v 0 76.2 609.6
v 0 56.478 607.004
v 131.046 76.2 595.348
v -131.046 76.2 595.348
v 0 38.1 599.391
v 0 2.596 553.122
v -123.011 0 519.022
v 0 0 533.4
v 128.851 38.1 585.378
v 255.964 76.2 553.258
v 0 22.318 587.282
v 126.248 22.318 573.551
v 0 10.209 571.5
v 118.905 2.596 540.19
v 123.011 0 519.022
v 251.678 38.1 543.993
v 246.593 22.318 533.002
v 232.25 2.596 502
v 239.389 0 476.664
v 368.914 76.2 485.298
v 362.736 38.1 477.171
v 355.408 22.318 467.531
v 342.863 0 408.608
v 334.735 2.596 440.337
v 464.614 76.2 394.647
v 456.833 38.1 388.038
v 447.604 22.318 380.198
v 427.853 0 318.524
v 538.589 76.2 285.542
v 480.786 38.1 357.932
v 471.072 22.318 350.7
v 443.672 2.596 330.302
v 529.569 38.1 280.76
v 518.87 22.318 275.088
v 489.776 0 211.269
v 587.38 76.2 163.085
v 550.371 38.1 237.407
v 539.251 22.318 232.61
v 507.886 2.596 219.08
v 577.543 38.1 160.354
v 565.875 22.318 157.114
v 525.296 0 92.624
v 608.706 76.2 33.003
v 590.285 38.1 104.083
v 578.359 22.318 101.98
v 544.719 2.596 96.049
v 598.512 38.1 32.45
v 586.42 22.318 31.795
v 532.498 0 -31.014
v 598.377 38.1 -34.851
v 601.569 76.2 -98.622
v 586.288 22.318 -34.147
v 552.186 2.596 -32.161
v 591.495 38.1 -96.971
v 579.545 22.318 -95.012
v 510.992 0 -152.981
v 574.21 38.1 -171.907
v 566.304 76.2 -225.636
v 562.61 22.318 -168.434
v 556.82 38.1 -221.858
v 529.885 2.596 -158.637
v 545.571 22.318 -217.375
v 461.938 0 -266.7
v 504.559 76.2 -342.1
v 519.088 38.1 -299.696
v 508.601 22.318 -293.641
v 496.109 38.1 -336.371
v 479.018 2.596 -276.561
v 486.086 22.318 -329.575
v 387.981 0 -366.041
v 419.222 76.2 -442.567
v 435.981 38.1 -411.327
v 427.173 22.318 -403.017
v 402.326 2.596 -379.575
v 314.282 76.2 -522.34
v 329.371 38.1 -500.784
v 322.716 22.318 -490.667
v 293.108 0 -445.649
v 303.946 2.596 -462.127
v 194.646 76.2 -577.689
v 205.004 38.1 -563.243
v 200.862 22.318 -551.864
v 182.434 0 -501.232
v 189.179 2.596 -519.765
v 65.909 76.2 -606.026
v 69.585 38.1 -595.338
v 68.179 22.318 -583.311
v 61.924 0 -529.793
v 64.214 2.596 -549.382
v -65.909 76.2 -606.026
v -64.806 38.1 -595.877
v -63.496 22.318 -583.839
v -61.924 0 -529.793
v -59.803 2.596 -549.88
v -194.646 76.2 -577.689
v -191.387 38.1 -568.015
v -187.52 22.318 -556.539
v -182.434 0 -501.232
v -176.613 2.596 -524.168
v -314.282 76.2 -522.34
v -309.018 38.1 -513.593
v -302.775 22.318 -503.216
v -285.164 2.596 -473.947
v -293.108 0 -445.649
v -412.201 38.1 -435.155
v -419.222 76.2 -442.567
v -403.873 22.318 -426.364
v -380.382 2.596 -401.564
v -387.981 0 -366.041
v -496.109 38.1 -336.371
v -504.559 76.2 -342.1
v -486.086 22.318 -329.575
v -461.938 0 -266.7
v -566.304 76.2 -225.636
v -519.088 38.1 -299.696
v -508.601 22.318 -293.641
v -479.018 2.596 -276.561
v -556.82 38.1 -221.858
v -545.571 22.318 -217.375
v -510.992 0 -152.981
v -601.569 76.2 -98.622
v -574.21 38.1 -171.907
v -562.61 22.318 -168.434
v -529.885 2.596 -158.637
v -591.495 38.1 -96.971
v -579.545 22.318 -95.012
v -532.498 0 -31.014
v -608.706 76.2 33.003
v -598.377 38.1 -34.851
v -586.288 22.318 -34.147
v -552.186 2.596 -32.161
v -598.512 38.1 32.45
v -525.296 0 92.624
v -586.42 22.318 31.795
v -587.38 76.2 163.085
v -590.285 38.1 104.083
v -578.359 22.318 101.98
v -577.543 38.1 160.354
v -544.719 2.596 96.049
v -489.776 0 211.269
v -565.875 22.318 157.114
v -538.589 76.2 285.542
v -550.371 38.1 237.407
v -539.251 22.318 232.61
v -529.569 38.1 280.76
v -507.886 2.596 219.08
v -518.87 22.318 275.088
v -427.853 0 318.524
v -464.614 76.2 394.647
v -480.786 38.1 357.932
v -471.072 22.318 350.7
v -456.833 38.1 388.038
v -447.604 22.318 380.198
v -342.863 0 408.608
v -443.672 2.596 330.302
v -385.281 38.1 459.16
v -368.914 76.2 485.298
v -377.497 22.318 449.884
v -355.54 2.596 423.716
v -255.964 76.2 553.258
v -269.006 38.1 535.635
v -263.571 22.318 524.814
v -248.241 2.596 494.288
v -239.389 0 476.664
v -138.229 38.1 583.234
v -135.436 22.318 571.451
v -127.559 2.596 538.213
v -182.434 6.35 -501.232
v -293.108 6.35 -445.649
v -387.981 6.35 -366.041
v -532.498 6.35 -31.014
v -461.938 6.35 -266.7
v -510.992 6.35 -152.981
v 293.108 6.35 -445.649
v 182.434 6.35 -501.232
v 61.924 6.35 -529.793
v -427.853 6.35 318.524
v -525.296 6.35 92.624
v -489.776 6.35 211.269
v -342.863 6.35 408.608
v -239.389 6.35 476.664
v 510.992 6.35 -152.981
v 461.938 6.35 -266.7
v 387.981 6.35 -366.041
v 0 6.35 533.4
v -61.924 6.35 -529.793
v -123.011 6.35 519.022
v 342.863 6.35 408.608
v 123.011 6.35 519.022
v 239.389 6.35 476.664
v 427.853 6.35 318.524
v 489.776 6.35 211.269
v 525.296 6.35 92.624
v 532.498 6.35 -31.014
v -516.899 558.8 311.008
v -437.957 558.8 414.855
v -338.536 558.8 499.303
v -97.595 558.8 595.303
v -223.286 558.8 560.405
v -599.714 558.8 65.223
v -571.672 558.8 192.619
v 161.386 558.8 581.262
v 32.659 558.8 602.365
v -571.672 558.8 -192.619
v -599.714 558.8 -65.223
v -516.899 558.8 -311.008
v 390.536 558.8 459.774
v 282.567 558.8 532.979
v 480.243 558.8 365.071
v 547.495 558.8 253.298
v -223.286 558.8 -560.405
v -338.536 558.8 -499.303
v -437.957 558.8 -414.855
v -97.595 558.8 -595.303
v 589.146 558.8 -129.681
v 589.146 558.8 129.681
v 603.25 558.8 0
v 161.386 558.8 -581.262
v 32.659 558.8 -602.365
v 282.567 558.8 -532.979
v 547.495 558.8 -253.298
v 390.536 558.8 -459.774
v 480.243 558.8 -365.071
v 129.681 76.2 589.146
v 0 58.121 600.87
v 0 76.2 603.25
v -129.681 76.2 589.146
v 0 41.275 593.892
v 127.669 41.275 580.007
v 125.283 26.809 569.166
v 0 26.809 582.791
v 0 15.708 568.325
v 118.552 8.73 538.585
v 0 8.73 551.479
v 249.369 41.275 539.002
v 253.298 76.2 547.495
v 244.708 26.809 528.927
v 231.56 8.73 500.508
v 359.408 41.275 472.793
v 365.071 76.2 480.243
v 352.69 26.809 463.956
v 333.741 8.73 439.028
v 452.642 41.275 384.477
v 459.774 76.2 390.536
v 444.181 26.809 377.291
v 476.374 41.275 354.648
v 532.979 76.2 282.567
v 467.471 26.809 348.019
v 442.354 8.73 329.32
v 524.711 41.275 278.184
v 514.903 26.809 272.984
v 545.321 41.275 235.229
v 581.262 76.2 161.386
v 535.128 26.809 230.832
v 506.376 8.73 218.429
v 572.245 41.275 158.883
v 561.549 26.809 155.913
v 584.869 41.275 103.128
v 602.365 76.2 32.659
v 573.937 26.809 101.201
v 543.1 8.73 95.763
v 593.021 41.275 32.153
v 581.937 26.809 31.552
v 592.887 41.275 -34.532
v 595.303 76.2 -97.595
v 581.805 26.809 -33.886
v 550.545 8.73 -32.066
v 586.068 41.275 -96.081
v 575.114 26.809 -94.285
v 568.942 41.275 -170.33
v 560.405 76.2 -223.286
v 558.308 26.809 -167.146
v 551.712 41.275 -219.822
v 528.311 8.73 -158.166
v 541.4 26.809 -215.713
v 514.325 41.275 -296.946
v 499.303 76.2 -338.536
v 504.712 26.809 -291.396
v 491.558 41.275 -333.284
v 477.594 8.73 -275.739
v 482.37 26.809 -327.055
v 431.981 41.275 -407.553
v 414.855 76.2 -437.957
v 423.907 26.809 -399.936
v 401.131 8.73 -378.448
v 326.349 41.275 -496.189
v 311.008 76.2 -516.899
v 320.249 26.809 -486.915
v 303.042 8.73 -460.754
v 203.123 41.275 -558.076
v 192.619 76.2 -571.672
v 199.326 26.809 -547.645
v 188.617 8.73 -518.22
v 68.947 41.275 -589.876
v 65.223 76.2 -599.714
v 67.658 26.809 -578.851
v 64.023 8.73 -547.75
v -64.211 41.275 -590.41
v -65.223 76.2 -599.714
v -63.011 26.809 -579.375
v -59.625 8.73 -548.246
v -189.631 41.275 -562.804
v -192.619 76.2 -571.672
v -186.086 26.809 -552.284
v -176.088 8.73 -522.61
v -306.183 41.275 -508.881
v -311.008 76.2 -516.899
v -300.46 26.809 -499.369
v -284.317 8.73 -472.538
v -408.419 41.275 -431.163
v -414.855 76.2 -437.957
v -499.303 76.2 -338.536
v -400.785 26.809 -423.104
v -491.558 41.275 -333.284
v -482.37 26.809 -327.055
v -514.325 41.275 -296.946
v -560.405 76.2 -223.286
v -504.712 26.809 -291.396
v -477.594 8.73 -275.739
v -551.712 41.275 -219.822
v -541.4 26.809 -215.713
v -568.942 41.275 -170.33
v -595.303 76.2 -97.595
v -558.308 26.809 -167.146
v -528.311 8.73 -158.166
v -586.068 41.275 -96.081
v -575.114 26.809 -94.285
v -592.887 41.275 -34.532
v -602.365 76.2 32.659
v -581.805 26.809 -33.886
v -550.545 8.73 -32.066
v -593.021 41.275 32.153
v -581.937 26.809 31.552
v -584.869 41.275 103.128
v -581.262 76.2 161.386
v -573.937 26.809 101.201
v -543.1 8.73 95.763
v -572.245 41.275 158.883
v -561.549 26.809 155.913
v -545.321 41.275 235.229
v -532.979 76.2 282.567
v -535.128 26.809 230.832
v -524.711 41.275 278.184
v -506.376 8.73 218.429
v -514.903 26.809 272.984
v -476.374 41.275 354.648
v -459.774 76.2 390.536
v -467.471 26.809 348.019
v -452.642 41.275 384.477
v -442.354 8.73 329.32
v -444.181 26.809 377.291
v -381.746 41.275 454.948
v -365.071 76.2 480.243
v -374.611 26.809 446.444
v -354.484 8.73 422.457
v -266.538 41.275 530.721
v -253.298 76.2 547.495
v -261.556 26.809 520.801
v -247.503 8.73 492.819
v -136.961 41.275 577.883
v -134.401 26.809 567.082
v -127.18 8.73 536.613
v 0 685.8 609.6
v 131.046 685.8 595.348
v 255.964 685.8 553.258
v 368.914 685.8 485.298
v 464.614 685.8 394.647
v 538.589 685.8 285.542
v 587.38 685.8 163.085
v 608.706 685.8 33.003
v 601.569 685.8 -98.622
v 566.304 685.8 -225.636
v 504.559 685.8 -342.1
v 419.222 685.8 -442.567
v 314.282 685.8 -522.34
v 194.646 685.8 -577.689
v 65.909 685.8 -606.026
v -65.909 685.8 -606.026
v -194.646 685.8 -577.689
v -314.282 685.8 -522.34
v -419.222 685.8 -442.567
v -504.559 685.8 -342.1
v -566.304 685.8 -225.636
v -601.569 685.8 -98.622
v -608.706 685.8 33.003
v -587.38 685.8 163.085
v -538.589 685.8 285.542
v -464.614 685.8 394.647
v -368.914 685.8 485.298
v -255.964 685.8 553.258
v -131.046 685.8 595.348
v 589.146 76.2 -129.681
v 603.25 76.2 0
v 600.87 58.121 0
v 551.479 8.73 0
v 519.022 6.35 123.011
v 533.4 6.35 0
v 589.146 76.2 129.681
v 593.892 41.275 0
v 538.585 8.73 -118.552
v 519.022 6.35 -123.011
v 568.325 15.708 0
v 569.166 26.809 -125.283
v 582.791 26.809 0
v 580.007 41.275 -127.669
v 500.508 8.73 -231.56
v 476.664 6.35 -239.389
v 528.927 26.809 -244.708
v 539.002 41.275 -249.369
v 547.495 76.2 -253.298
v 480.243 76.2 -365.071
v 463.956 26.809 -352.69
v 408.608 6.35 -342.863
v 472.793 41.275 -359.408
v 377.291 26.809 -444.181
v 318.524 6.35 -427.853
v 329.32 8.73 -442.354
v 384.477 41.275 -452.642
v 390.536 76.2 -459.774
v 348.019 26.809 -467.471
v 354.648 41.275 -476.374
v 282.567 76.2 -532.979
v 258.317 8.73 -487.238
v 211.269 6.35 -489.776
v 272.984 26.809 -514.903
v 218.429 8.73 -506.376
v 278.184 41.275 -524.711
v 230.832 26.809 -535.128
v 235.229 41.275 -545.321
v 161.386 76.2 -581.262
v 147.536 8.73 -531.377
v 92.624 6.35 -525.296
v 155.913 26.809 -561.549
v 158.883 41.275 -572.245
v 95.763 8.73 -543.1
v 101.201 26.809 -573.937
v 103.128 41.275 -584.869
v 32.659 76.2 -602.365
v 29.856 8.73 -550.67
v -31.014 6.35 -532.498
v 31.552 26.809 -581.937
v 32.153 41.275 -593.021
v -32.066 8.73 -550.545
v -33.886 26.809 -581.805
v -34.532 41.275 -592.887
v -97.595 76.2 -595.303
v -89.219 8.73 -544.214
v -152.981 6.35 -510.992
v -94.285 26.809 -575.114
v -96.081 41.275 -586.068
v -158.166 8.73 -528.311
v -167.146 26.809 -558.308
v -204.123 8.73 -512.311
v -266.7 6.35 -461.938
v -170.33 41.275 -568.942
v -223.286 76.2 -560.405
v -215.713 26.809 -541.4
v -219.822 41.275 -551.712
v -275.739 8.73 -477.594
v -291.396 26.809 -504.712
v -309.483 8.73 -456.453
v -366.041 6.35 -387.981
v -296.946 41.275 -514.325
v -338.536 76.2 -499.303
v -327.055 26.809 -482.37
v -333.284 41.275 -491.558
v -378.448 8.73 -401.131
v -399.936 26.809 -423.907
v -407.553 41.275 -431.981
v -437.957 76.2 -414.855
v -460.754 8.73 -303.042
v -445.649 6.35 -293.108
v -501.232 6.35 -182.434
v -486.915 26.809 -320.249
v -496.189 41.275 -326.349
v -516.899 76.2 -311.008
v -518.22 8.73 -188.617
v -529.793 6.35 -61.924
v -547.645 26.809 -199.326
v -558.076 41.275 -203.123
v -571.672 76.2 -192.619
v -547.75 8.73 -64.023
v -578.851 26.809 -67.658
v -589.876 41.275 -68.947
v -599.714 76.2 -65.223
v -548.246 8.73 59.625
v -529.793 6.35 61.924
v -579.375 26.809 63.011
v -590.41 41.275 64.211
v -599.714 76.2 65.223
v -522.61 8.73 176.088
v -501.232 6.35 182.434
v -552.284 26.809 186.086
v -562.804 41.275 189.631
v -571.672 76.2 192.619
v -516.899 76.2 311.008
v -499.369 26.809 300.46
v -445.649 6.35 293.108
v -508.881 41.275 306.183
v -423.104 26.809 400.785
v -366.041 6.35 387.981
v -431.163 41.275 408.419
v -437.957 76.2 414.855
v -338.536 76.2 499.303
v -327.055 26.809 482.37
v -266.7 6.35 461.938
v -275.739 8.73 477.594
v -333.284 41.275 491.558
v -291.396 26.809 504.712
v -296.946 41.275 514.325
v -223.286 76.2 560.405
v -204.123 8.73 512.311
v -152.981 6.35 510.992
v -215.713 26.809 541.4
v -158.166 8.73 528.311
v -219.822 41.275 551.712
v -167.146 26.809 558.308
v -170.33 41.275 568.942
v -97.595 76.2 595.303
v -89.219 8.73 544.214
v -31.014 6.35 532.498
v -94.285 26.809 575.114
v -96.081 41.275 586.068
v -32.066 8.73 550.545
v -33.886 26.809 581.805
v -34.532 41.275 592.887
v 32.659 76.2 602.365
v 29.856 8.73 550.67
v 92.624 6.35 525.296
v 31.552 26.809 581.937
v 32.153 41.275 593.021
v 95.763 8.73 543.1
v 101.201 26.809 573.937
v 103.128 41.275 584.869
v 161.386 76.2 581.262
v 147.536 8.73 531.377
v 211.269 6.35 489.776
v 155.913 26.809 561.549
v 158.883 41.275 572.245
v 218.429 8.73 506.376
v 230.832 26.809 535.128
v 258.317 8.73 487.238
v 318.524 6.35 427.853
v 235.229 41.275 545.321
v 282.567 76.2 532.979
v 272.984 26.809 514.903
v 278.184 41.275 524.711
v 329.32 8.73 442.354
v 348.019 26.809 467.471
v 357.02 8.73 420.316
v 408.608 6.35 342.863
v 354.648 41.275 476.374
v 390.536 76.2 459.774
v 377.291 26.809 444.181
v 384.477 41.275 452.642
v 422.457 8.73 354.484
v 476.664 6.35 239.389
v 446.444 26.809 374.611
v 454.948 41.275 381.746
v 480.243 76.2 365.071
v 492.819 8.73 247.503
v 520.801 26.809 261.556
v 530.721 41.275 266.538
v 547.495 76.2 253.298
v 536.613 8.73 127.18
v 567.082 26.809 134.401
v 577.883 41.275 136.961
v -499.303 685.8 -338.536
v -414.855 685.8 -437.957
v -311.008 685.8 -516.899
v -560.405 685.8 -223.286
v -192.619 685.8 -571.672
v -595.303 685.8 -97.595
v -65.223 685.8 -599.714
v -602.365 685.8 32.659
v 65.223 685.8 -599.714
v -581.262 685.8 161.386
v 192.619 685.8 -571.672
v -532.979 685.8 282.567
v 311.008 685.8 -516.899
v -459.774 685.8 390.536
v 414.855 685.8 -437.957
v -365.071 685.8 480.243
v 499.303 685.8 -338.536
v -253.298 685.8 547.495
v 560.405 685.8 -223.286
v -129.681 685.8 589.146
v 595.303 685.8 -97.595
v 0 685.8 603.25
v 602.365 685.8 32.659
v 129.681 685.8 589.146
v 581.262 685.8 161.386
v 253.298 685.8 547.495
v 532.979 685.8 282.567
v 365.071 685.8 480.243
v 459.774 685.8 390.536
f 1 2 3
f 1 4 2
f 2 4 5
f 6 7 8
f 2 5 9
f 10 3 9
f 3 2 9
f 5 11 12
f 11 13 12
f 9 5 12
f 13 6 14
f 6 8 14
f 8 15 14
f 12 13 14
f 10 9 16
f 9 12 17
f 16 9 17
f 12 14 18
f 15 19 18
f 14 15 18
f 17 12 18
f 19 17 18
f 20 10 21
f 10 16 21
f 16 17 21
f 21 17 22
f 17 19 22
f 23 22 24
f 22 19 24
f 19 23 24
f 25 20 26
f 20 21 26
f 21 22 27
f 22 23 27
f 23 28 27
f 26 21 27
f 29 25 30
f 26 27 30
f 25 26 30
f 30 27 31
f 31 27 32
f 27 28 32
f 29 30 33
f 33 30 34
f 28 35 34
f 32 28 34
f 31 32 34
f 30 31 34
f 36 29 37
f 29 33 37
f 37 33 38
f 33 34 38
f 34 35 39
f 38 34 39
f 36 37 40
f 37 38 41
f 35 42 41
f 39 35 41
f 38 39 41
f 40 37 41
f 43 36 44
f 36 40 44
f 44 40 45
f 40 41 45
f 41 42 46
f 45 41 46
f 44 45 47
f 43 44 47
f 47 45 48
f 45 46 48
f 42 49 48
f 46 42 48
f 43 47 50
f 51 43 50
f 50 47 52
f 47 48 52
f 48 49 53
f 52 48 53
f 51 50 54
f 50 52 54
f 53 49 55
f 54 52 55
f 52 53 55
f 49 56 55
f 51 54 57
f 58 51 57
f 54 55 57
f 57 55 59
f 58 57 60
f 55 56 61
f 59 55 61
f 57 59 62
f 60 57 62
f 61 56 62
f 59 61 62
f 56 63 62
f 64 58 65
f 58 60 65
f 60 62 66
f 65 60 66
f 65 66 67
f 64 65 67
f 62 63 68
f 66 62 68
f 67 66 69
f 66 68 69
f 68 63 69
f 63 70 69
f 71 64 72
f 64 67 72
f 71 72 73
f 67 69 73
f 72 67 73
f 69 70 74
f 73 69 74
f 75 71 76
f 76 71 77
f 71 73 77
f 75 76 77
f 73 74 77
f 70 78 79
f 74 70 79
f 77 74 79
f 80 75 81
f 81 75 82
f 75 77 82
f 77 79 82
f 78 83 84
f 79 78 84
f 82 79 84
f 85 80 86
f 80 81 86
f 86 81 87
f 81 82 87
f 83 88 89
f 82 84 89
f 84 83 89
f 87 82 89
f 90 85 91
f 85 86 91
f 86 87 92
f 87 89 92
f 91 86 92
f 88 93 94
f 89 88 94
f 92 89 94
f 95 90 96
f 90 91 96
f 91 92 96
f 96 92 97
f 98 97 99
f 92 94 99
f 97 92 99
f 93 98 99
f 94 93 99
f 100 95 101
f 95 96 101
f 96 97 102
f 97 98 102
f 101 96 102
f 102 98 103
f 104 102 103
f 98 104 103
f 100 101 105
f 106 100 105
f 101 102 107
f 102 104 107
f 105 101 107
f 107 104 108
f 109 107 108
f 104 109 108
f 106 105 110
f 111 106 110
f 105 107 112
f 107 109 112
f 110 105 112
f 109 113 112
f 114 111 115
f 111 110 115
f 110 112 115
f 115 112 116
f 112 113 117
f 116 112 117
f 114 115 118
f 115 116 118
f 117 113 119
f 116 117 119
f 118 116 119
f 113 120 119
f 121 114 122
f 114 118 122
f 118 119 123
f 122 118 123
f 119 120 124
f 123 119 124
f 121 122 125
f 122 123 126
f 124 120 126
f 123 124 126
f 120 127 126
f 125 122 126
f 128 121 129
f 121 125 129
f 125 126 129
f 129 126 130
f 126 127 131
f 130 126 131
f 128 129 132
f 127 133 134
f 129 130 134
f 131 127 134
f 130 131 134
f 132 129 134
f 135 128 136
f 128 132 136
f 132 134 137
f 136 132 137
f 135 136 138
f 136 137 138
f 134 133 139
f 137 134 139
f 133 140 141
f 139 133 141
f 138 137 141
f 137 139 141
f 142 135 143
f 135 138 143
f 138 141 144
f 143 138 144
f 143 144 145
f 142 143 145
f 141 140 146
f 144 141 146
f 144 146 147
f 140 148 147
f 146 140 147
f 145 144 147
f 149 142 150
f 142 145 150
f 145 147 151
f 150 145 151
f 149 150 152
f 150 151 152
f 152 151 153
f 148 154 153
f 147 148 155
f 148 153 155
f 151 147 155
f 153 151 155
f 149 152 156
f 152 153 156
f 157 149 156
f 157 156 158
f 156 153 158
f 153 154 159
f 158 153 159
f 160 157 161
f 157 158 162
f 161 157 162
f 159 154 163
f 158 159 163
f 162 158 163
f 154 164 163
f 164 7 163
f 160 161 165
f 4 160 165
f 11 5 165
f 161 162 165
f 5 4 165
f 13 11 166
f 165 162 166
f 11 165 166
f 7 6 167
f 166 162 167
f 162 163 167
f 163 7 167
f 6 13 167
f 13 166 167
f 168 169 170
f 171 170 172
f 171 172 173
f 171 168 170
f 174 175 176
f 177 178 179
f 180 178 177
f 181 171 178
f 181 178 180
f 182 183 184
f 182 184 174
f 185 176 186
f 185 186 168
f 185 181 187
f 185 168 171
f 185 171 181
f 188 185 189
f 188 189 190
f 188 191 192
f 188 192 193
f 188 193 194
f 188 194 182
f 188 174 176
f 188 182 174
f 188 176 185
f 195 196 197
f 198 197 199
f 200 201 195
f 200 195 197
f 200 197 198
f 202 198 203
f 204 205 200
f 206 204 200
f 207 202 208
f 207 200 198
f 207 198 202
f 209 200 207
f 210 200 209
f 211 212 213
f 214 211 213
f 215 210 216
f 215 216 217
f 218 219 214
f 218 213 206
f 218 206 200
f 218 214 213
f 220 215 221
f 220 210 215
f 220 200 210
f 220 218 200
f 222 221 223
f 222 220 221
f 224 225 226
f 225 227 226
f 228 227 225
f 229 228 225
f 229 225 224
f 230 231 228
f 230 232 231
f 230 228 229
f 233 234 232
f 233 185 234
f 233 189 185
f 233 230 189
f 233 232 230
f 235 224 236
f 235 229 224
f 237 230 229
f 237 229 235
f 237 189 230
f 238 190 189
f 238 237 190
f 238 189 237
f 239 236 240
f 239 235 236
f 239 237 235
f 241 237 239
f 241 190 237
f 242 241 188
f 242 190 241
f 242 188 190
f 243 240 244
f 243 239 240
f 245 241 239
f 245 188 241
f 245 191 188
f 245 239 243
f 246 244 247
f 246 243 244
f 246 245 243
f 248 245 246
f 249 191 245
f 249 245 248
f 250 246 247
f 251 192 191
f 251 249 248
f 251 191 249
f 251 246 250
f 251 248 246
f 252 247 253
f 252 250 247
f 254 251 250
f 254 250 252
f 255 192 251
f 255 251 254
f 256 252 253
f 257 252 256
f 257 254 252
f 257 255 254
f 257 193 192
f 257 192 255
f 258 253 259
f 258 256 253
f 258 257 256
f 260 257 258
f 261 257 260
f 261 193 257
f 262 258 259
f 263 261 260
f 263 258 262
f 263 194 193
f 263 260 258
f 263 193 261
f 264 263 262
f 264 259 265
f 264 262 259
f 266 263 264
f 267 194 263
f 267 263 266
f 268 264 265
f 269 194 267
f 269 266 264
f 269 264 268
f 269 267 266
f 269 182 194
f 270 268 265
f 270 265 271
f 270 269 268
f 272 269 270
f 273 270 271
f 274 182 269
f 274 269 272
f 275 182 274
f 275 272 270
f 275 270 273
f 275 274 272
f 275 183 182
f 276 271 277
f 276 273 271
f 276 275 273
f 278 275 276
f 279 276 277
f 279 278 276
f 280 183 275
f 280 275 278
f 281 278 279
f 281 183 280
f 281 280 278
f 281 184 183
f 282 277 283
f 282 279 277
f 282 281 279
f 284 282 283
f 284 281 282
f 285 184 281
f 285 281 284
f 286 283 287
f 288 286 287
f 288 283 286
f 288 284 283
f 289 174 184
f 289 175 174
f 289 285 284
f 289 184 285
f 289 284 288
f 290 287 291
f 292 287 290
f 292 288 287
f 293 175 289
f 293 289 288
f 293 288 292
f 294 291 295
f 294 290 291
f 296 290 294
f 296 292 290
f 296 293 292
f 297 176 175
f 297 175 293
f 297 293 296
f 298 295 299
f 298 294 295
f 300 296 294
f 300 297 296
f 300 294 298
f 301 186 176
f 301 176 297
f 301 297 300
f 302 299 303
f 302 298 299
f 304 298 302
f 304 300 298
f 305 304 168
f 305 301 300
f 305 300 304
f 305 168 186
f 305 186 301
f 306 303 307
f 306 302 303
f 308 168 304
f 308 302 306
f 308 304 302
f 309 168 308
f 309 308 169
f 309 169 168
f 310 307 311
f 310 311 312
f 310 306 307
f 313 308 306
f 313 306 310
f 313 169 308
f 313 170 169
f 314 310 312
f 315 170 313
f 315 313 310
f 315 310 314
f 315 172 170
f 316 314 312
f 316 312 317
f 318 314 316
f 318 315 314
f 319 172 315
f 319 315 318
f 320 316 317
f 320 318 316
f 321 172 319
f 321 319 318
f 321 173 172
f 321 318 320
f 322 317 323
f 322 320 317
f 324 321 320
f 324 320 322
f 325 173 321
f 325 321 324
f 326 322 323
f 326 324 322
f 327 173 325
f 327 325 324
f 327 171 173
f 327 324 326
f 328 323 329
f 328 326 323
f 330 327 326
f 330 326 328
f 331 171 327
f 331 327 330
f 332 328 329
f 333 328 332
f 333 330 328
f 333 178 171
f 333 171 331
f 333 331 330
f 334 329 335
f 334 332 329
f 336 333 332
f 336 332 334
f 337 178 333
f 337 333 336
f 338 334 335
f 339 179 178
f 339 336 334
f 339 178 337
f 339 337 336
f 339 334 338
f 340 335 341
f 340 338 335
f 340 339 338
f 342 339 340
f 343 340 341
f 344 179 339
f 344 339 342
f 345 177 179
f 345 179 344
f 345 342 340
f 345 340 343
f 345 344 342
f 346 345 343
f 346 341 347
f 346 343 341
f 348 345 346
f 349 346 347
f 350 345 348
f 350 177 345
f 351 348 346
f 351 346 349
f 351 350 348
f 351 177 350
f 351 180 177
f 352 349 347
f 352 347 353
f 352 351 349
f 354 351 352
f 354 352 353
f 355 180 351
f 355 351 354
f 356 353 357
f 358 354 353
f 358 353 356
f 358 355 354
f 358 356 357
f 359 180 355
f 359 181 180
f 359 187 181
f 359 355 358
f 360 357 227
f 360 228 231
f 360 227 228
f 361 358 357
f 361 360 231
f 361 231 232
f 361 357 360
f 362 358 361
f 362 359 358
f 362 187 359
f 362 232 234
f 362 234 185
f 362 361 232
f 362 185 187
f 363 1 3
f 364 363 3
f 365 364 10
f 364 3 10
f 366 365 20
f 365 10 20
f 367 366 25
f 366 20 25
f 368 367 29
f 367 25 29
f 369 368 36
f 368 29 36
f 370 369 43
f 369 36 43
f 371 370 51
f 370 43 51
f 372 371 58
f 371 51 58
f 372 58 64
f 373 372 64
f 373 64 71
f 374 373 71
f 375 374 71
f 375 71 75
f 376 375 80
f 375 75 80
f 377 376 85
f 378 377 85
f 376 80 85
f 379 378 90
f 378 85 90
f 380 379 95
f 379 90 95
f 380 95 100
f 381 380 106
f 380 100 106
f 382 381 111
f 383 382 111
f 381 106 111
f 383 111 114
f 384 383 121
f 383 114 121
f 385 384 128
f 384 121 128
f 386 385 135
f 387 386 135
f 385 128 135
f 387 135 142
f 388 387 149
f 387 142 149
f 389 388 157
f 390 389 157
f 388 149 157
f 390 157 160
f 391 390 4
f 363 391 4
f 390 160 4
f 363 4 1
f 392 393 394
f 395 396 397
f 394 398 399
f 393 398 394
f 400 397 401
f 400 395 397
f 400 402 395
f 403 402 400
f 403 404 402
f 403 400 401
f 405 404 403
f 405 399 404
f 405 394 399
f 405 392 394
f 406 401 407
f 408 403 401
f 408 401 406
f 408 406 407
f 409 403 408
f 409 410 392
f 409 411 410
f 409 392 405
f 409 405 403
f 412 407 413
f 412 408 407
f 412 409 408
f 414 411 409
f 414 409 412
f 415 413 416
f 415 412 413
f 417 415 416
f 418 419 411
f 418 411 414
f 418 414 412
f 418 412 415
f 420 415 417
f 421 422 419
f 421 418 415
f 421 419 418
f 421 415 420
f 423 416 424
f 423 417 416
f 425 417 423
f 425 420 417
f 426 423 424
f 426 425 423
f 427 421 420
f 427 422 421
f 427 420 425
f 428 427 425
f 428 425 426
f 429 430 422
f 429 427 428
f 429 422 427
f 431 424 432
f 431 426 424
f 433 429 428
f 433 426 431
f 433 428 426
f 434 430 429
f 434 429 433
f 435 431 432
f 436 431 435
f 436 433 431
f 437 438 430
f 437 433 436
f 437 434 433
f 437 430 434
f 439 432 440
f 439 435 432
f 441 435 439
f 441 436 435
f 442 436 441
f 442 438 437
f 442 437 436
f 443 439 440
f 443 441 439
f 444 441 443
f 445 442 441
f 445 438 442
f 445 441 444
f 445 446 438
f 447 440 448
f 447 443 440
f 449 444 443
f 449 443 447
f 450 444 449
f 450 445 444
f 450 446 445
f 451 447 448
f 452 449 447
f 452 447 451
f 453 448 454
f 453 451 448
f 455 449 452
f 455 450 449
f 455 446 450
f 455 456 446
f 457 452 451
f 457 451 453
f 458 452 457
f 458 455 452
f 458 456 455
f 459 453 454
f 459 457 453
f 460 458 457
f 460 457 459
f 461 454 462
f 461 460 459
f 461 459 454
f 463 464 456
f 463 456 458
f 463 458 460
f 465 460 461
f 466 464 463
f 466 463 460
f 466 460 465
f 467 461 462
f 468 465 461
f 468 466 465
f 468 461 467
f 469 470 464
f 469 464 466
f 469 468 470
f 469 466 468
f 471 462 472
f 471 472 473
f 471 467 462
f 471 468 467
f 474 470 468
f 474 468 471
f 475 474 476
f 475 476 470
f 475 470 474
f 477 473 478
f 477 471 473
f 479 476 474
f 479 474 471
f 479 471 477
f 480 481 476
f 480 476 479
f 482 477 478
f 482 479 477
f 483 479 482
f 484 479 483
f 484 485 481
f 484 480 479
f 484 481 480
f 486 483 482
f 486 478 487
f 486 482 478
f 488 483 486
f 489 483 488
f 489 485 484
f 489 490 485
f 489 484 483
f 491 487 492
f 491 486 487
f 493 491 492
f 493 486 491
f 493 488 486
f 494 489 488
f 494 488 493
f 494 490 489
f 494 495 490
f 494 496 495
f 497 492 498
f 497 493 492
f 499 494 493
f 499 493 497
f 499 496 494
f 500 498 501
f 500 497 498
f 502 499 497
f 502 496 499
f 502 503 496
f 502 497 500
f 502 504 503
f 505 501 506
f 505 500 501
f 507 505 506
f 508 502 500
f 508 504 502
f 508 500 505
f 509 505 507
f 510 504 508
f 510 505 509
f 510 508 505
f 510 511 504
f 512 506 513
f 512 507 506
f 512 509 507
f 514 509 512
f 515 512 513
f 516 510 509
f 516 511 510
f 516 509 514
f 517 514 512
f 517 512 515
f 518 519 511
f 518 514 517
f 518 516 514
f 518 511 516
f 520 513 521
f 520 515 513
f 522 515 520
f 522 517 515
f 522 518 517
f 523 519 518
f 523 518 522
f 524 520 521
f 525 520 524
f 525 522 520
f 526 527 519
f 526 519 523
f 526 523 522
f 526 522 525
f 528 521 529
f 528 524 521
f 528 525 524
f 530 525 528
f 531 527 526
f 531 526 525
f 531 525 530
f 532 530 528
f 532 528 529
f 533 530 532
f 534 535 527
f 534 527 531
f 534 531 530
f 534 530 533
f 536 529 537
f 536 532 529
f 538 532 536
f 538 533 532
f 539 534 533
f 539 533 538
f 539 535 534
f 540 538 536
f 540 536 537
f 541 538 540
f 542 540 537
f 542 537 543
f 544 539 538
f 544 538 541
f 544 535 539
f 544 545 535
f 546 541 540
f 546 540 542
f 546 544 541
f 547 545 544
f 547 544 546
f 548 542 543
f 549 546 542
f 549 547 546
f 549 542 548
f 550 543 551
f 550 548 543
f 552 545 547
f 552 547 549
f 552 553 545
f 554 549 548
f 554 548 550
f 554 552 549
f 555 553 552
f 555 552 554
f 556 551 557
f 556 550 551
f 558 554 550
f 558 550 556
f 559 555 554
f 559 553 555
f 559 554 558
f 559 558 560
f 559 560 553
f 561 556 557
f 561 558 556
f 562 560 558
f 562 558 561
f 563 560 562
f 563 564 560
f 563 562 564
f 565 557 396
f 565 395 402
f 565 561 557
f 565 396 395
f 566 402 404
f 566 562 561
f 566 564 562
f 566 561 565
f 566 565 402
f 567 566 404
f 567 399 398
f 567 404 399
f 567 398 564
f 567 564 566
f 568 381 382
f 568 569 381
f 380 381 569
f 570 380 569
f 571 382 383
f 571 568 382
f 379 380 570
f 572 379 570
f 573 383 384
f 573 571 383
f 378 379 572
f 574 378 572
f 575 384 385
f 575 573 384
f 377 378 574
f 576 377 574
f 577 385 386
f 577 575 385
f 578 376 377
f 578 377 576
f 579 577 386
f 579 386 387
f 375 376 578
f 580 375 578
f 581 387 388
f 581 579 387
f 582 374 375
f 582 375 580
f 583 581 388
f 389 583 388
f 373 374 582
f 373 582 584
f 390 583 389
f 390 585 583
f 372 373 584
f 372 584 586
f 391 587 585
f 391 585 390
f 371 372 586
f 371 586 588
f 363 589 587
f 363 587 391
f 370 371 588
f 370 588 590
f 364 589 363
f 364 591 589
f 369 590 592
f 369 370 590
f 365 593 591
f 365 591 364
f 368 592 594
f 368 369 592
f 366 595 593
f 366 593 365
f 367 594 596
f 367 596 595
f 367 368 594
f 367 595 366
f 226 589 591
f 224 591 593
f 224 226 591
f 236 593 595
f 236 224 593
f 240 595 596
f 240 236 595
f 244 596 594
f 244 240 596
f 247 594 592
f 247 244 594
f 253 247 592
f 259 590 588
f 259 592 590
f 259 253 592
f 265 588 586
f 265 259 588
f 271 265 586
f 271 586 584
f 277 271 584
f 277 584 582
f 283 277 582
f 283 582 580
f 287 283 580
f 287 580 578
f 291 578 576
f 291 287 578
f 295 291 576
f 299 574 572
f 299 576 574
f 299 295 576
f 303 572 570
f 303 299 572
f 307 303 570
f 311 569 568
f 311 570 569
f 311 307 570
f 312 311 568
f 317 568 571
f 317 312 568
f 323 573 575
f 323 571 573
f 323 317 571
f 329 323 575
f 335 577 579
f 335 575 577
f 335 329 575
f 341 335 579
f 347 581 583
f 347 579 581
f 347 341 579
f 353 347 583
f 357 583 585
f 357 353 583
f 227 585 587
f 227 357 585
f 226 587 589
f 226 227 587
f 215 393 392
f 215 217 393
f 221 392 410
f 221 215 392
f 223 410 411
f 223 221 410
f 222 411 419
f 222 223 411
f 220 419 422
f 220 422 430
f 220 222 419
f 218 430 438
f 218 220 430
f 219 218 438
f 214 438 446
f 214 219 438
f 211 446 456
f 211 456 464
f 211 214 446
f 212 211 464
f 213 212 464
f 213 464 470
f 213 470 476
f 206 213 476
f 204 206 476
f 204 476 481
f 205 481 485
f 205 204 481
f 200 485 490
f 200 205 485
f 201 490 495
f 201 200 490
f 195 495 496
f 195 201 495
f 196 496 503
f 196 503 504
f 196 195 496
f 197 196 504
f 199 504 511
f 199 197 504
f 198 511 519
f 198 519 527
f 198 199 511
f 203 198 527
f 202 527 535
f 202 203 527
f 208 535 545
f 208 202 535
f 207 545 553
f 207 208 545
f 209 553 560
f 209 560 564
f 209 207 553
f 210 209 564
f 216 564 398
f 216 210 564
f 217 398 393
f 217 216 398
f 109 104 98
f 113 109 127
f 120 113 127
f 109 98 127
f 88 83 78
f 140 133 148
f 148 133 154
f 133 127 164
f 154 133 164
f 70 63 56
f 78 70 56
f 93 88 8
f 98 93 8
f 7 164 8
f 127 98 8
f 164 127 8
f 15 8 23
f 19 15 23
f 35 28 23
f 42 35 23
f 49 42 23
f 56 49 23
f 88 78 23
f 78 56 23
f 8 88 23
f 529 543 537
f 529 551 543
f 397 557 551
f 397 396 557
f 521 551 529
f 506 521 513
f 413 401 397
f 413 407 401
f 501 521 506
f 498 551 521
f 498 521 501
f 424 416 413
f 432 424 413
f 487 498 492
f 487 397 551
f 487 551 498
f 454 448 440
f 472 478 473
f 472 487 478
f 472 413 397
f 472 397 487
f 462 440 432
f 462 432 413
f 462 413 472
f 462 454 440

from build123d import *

# Parameters (mm, degrees)
SKETCH1_R           = 609.6
BOSS_EXTRUDE1_DEPTH = 685.8
FILLET1_R           = 76.2
SHELL1_T            = -6.35


# Read off the part's stored shape, not the designer's step: Boss-Extrude2
with BuildPart() as part:
    # Sketch1 → Boss-Extrude1 (new body)
    with BuildSketch(Plane(origin=(0, 0, 0), x_dir=(1, 0, 0), z_dir=(0, 1, 0))):
        with Locations(Location((0, 0, 0), (0, 0, 270))):
            Circle(SKETCH1_R)
    extrude(amount=BOSS_EXTRUDE1_DEPTH)

    # Fillet1
    fillet1_edges = [part.edges().sort_by_distance(p)[0] for p in [
        (0, 0, -609.6),
    ]]
    fillet(fillet1_edges, radius=FILLET1_R)

    # Shell1
    shell1_openings = [part.faces().sort_by_distance(p)[0] for p in [
        (0, 685.8, 0),
    ]]
    offset(amount=SHELL1_T, openings=shell1_openings, kind=Kind.INTERSECTION)


with BuildPart() as body_2:
    # Boss-Extrude2 outline → Boss-Extrude2 (revolve)
    with BuildSketch(Plane.XY):
        with BuildLine():
            Line((0, 558.8), (0, 6.35))
            Line((0, 6.35), (533.4, 6.35))
            ThreePointArc((533.4, 6.35), (582.791408666, 26.808591334), (603.25, 76.2))
            Line((603.25, 76.2), (603.25, 558.8))
            Line((603.25, 558.8), (0, 558.8))
        make_face()
    revolve(axis=Axis((0, 0, 0), (0, 1, 0)))


solid = Compound([part.part, body_2.part])
